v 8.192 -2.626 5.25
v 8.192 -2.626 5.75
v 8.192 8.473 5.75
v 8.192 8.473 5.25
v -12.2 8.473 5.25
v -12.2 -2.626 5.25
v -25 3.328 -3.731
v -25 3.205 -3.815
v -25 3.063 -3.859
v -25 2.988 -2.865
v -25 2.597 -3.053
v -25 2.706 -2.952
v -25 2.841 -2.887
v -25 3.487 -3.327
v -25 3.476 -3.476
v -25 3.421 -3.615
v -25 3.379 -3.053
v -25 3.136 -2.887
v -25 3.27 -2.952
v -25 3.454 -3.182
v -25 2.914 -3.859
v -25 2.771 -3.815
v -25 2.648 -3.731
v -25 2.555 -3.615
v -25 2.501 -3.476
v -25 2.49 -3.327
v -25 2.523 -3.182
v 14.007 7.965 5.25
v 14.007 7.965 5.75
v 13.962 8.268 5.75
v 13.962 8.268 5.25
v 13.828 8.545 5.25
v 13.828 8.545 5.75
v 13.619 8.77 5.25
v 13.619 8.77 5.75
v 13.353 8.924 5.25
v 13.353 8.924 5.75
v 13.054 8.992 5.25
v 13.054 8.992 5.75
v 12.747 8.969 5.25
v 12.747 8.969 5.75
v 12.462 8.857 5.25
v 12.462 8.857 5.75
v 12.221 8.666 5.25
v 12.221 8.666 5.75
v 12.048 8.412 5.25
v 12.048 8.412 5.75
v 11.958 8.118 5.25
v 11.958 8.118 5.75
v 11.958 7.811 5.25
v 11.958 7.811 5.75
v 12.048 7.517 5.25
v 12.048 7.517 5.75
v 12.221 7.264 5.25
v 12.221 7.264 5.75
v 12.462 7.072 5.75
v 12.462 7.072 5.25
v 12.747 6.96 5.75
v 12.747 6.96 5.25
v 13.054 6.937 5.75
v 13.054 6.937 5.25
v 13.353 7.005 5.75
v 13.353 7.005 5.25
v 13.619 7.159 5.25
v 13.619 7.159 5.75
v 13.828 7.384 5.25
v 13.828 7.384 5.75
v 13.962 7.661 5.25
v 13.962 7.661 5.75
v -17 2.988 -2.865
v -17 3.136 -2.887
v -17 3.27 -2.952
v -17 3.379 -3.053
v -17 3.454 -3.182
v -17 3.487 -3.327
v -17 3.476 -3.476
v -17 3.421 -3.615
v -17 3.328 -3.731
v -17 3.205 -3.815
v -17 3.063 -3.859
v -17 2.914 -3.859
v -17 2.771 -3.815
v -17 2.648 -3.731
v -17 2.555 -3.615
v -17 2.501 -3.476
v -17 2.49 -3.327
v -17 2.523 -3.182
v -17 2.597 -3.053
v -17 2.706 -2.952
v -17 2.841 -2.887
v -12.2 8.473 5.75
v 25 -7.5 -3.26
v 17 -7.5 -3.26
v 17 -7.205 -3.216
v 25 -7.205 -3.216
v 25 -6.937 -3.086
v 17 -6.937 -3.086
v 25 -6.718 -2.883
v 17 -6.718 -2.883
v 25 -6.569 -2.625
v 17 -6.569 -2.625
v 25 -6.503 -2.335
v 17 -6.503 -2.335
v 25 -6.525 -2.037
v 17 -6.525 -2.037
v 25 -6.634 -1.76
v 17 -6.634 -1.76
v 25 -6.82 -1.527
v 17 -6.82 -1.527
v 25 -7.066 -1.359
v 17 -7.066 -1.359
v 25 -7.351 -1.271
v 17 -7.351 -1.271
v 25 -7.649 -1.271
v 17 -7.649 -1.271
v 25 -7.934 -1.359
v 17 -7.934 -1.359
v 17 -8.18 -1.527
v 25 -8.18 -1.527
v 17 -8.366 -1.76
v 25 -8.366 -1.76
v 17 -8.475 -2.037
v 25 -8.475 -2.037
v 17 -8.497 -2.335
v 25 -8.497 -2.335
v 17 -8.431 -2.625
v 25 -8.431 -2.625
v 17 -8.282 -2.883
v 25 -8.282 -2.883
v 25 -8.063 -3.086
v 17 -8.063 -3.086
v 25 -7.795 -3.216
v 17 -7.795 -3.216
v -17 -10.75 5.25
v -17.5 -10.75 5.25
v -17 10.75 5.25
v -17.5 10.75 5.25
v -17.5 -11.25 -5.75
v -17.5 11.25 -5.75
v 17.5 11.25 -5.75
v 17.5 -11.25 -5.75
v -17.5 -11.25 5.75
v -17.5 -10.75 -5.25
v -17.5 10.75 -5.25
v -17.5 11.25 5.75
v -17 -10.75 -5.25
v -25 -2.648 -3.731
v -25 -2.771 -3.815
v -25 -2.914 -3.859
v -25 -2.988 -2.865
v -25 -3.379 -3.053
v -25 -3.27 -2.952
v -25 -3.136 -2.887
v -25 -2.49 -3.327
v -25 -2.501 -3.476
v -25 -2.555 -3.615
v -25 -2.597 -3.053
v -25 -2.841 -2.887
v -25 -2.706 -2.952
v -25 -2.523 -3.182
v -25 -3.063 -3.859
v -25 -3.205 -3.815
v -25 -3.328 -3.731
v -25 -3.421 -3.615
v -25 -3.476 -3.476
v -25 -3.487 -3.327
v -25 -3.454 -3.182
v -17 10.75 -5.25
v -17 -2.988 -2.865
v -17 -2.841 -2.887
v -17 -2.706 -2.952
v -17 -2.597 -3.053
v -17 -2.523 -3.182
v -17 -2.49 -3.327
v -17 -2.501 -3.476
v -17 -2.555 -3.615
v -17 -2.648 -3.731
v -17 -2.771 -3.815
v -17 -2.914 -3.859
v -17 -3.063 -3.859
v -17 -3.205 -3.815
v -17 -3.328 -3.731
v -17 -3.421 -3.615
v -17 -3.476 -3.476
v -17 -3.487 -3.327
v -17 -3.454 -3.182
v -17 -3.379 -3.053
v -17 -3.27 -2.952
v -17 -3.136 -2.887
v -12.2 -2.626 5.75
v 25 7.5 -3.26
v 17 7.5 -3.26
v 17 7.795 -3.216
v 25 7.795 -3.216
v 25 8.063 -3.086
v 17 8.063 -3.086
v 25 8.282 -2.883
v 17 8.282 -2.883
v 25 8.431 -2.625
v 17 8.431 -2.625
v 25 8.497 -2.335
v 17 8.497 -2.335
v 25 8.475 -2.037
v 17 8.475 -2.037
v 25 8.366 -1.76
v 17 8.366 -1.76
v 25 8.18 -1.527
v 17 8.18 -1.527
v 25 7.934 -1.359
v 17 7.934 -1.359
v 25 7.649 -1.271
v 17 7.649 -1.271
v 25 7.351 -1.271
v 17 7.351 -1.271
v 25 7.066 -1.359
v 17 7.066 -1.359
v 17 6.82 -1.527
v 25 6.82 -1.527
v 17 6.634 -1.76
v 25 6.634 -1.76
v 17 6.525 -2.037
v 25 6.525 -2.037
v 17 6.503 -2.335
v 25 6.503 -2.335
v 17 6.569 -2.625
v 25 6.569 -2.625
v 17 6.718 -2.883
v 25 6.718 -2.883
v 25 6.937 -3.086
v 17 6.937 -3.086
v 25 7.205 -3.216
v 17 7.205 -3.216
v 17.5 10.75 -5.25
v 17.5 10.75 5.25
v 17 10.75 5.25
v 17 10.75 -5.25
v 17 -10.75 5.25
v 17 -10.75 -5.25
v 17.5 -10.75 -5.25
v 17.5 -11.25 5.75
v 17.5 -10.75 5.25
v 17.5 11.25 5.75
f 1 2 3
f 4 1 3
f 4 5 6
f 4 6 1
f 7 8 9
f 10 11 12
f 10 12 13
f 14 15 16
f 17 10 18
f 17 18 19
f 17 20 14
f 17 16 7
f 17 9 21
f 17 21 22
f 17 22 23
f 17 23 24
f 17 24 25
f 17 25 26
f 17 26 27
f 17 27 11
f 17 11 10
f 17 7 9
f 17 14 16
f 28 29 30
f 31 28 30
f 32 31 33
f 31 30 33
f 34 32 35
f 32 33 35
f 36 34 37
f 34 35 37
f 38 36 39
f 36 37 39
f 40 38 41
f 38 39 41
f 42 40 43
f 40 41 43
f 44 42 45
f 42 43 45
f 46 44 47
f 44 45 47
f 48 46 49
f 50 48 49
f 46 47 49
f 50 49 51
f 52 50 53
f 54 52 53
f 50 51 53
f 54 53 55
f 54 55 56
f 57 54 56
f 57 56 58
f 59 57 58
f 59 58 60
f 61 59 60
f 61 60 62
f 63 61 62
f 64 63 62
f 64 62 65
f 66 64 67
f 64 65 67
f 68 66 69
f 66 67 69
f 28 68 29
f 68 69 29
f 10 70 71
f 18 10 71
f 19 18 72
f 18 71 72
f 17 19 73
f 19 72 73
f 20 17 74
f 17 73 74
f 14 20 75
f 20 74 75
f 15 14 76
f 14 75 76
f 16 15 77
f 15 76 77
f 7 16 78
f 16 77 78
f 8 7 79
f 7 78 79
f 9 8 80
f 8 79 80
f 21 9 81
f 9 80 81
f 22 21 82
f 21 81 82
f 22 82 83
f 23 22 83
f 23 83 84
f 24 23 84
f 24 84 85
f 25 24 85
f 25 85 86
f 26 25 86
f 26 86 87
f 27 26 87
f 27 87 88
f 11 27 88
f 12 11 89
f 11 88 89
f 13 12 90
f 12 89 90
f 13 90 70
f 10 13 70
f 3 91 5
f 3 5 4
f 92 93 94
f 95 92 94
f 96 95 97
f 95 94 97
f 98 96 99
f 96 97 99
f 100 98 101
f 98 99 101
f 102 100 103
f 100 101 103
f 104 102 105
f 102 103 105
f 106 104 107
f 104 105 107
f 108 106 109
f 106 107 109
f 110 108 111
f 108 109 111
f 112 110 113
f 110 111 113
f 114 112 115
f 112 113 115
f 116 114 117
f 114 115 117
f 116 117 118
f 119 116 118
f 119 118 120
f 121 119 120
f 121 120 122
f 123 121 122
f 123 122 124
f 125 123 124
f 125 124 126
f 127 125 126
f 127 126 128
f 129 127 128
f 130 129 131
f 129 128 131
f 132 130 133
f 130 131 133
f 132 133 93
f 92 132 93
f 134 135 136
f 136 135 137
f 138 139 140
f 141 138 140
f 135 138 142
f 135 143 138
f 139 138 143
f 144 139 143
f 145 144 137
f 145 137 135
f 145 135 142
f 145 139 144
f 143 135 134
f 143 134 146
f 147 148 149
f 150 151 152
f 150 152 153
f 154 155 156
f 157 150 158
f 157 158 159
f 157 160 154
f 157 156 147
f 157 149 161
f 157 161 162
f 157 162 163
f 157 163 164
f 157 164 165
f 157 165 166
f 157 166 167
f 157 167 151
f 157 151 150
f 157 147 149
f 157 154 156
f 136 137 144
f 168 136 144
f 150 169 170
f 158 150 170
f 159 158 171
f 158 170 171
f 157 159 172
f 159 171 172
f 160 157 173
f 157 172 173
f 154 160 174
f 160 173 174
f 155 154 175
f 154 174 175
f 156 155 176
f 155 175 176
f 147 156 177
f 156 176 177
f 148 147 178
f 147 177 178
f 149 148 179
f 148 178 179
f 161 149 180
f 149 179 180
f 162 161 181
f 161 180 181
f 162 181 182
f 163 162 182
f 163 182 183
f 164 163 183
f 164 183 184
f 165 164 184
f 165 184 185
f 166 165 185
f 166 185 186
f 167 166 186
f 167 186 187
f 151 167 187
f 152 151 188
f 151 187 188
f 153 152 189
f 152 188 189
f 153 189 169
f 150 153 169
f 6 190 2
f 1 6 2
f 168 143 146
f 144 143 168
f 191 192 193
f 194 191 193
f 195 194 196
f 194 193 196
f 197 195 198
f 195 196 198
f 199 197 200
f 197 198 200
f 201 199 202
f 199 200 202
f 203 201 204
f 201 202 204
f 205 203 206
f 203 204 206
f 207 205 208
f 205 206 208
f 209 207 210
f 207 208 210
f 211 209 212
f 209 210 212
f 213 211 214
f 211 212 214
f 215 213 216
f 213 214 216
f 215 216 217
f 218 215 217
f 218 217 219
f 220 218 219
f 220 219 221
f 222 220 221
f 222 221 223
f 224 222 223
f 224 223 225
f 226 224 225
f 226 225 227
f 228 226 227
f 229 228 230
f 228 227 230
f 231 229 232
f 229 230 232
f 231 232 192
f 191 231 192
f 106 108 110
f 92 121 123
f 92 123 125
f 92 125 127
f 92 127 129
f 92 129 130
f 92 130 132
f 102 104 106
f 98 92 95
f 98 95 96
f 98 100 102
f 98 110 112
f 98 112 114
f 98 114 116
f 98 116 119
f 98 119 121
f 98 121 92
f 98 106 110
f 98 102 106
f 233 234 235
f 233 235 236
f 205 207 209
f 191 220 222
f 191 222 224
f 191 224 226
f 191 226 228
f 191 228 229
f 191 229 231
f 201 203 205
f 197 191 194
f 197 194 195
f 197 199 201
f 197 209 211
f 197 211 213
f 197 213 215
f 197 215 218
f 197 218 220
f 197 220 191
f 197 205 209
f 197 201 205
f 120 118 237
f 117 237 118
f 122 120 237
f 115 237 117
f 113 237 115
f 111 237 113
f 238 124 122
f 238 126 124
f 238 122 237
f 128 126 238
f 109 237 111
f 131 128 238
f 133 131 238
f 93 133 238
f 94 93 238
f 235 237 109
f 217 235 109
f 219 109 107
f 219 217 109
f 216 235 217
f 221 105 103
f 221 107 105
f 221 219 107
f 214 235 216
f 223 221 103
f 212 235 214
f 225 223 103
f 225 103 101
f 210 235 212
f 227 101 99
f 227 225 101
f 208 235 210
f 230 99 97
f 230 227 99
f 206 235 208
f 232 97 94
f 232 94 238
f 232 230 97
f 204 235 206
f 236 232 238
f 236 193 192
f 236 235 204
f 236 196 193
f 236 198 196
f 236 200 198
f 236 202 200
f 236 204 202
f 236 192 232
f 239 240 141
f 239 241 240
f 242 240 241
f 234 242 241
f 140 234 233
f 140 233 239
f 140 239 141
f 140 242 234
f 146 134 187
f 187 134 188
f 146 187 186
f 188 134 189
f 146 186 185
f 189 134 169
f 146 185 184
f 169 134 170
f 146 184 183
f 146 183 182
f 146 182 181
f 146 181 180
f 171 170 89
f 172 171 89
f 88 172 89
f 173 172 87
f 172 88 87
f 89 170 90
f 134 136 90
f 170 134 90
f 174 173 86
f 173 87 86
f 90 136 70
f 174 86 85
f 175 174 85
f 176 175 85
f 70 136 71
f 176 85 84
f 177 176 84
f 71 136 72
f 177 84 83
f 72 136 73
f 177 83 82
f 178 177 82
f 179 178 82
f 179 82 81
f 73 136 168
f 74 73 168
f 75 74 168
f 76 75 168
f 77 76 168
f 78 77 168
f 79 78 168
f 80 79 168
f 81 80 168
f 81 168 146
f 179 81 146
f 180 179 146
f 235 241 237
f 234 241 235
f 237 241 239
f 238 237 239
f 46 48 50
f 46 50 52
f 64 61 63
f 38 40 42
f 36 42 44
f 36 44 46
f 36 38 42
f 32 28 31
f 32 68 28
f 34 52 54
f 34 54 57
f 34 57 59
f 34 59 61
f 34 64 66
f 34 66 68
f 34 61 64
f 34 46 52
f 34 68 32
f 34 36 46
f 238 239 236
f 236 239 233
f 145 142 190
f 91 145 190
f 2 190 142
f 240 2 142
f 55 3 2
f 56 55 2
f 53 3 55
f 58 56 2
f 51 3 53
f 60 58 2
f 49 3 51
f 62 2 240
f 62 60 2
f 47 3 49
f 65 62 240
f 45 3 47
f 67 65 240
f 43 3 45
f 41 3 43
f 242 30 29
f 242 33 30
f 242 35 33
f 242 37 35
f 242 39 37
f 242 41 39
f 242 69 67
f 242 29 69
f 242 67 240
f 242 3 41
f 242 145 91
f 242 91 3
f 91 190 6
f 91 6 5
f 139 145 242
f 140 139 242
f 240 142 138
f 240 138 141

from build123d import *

# Parameters (mm, degrees)
SKETCH1_W           = 42
SKETCH1_H           = 22.5
BOSS_EXTRUDE1_DEPTH = 5.75
SKETCH2_W           = 10.5
SKETCH2_H           = 21.5
CUT_EXTRUDE1_DEPTH  = 4
SKETCH3_R           = 1
BOSS_EXTRUDE2_DEPTH = 8
SKETCH4_R           = 0.5
BOSS_EXTRUDE3_DEPTH = 8
SKETCH5_R           = 1.030633651
SKETCH5_W           = 20.392034512
SKETCH5_H           = 11.098868447
CUT_EXTRUDE2_DEPTH  = 0.5
SKETCH9_W           = 11.5
SKETCH9_H           = 22.5
SKETCH9_W_2         = 10.5
SKETCH9_H_2         = 21.5
CUT_EXTRUDE5_DEPTH  = 3.5
SKETCH10_W          = 11.5
SKETCH10_H          = 22.5
SKETCH10_W_2        = 10.5
SKETCH10_H_2        = 21.5
CUT_EXTRUDE6_DEPTH  = 3.5


with BuildPart() as part:
    # Sketch1 → Boss-Extrude1 (new body, symmetric)
    with BuildSketch(Plane.XY):
        Rectangle(SKETCH1_W, SKETCH1_H)
    extrude(amount=BOSS_EXTRUDE1_DEPTH, both=True)

    # Sketch2 → Cut-Extrude1 (cut)
    with BuildSketch(Plane(origin=(21, 0, 0), x_dir=(0, 0, -1), z_dir=(1, 0, 0))):
        Rectangle(SKETCH2_W, SKETCH2_H)
    cut_extrude1 = extrude(amount=-CUT_EXTRUDE1_DEPTH, mode=Mode.SUBTRACT)

    # Mirror1: Cut-Extrude1 across plane
    add(cut_extrude1.mirror(Plane(origin=(0, 0, 0), x_dir=(0, 0, 1), z_dir=(1, 0, 0))), mode=Mode.SUBTRACT)

    # Sketch3 → Boss-Extrude2 (add)
    with BuildSketch(Plane(origin=(17, 0, 0), x_dir=(0, 0, -1), z_dir=(1, 0, 0))):
        with Locations((2.259944465, 7.5)):
            Circle(SKETCH3_R)
        with Locations((2.259944465, -7.5)):
            Circle(SKETCH3_R)
    extrude(amount=BOSS_EXTRUDE2_DEPTH)

    # Sketch4 → Boss-Extrude3 (add)
    with BuildSketch(Plane.ZY.offset(17)):
        with Locations((-3.364806204, 2.988148793)):
            Circle(SKETCH4_R)
        with Locations((-3.364806204, -2.988148793)):
            Circle(SKETCH4_R)
    extrude(amount=BOSS_EXTRUDE3_DEPTH)

    # Sketch5 → Cut-Extrude2 (cut)
    with BuildSketch(Plane.XY.offset(5.75)):
        with Locations((12.976825893, 7.964601522)):
            Circle(SKETCH5_R)
        with Locations((-2.003815564, 2.9231166)):
            Rectangle(SKETCH5_W, SKETCH5_H)
    extrude(amount=-CUT_EXTRUDE2_DEPTH, mode=Mode.SUBTRACT)

    # Sketch9 → Cut-Extrude5 (cut)
    with BuildSketch(Plane(origin=(21, 0, 0), x_dir=(0, 0, -1), z_dir=(1, 0, 0))):
        Rectangle(SKETCH9_W, SKETCH9_H)
        Rectangle(SKETCH9_W_2, SKETCH9_H_2, mode=Mode.SUBTRACT)
    extrude(amount=-CUT_EXTRUDE5_DEPTH, mode=Mode.SUBTRACT)

    # Sketch10 → Cut-Extrude6 (cut)
    with BuildSketch(Plane.ZY.offset(21)):
        Rectangle(SKETCH10_W, SKETCH10_H)
        Rectangle(SKETCH10_W_2, SKETCH10_H_2, mode=Mode.SUBTRACT)
    extrude(amount=-CUT_EXTRUDE6_DEPTH, mode=Mode.SUBTRACT)


solid = part.part
